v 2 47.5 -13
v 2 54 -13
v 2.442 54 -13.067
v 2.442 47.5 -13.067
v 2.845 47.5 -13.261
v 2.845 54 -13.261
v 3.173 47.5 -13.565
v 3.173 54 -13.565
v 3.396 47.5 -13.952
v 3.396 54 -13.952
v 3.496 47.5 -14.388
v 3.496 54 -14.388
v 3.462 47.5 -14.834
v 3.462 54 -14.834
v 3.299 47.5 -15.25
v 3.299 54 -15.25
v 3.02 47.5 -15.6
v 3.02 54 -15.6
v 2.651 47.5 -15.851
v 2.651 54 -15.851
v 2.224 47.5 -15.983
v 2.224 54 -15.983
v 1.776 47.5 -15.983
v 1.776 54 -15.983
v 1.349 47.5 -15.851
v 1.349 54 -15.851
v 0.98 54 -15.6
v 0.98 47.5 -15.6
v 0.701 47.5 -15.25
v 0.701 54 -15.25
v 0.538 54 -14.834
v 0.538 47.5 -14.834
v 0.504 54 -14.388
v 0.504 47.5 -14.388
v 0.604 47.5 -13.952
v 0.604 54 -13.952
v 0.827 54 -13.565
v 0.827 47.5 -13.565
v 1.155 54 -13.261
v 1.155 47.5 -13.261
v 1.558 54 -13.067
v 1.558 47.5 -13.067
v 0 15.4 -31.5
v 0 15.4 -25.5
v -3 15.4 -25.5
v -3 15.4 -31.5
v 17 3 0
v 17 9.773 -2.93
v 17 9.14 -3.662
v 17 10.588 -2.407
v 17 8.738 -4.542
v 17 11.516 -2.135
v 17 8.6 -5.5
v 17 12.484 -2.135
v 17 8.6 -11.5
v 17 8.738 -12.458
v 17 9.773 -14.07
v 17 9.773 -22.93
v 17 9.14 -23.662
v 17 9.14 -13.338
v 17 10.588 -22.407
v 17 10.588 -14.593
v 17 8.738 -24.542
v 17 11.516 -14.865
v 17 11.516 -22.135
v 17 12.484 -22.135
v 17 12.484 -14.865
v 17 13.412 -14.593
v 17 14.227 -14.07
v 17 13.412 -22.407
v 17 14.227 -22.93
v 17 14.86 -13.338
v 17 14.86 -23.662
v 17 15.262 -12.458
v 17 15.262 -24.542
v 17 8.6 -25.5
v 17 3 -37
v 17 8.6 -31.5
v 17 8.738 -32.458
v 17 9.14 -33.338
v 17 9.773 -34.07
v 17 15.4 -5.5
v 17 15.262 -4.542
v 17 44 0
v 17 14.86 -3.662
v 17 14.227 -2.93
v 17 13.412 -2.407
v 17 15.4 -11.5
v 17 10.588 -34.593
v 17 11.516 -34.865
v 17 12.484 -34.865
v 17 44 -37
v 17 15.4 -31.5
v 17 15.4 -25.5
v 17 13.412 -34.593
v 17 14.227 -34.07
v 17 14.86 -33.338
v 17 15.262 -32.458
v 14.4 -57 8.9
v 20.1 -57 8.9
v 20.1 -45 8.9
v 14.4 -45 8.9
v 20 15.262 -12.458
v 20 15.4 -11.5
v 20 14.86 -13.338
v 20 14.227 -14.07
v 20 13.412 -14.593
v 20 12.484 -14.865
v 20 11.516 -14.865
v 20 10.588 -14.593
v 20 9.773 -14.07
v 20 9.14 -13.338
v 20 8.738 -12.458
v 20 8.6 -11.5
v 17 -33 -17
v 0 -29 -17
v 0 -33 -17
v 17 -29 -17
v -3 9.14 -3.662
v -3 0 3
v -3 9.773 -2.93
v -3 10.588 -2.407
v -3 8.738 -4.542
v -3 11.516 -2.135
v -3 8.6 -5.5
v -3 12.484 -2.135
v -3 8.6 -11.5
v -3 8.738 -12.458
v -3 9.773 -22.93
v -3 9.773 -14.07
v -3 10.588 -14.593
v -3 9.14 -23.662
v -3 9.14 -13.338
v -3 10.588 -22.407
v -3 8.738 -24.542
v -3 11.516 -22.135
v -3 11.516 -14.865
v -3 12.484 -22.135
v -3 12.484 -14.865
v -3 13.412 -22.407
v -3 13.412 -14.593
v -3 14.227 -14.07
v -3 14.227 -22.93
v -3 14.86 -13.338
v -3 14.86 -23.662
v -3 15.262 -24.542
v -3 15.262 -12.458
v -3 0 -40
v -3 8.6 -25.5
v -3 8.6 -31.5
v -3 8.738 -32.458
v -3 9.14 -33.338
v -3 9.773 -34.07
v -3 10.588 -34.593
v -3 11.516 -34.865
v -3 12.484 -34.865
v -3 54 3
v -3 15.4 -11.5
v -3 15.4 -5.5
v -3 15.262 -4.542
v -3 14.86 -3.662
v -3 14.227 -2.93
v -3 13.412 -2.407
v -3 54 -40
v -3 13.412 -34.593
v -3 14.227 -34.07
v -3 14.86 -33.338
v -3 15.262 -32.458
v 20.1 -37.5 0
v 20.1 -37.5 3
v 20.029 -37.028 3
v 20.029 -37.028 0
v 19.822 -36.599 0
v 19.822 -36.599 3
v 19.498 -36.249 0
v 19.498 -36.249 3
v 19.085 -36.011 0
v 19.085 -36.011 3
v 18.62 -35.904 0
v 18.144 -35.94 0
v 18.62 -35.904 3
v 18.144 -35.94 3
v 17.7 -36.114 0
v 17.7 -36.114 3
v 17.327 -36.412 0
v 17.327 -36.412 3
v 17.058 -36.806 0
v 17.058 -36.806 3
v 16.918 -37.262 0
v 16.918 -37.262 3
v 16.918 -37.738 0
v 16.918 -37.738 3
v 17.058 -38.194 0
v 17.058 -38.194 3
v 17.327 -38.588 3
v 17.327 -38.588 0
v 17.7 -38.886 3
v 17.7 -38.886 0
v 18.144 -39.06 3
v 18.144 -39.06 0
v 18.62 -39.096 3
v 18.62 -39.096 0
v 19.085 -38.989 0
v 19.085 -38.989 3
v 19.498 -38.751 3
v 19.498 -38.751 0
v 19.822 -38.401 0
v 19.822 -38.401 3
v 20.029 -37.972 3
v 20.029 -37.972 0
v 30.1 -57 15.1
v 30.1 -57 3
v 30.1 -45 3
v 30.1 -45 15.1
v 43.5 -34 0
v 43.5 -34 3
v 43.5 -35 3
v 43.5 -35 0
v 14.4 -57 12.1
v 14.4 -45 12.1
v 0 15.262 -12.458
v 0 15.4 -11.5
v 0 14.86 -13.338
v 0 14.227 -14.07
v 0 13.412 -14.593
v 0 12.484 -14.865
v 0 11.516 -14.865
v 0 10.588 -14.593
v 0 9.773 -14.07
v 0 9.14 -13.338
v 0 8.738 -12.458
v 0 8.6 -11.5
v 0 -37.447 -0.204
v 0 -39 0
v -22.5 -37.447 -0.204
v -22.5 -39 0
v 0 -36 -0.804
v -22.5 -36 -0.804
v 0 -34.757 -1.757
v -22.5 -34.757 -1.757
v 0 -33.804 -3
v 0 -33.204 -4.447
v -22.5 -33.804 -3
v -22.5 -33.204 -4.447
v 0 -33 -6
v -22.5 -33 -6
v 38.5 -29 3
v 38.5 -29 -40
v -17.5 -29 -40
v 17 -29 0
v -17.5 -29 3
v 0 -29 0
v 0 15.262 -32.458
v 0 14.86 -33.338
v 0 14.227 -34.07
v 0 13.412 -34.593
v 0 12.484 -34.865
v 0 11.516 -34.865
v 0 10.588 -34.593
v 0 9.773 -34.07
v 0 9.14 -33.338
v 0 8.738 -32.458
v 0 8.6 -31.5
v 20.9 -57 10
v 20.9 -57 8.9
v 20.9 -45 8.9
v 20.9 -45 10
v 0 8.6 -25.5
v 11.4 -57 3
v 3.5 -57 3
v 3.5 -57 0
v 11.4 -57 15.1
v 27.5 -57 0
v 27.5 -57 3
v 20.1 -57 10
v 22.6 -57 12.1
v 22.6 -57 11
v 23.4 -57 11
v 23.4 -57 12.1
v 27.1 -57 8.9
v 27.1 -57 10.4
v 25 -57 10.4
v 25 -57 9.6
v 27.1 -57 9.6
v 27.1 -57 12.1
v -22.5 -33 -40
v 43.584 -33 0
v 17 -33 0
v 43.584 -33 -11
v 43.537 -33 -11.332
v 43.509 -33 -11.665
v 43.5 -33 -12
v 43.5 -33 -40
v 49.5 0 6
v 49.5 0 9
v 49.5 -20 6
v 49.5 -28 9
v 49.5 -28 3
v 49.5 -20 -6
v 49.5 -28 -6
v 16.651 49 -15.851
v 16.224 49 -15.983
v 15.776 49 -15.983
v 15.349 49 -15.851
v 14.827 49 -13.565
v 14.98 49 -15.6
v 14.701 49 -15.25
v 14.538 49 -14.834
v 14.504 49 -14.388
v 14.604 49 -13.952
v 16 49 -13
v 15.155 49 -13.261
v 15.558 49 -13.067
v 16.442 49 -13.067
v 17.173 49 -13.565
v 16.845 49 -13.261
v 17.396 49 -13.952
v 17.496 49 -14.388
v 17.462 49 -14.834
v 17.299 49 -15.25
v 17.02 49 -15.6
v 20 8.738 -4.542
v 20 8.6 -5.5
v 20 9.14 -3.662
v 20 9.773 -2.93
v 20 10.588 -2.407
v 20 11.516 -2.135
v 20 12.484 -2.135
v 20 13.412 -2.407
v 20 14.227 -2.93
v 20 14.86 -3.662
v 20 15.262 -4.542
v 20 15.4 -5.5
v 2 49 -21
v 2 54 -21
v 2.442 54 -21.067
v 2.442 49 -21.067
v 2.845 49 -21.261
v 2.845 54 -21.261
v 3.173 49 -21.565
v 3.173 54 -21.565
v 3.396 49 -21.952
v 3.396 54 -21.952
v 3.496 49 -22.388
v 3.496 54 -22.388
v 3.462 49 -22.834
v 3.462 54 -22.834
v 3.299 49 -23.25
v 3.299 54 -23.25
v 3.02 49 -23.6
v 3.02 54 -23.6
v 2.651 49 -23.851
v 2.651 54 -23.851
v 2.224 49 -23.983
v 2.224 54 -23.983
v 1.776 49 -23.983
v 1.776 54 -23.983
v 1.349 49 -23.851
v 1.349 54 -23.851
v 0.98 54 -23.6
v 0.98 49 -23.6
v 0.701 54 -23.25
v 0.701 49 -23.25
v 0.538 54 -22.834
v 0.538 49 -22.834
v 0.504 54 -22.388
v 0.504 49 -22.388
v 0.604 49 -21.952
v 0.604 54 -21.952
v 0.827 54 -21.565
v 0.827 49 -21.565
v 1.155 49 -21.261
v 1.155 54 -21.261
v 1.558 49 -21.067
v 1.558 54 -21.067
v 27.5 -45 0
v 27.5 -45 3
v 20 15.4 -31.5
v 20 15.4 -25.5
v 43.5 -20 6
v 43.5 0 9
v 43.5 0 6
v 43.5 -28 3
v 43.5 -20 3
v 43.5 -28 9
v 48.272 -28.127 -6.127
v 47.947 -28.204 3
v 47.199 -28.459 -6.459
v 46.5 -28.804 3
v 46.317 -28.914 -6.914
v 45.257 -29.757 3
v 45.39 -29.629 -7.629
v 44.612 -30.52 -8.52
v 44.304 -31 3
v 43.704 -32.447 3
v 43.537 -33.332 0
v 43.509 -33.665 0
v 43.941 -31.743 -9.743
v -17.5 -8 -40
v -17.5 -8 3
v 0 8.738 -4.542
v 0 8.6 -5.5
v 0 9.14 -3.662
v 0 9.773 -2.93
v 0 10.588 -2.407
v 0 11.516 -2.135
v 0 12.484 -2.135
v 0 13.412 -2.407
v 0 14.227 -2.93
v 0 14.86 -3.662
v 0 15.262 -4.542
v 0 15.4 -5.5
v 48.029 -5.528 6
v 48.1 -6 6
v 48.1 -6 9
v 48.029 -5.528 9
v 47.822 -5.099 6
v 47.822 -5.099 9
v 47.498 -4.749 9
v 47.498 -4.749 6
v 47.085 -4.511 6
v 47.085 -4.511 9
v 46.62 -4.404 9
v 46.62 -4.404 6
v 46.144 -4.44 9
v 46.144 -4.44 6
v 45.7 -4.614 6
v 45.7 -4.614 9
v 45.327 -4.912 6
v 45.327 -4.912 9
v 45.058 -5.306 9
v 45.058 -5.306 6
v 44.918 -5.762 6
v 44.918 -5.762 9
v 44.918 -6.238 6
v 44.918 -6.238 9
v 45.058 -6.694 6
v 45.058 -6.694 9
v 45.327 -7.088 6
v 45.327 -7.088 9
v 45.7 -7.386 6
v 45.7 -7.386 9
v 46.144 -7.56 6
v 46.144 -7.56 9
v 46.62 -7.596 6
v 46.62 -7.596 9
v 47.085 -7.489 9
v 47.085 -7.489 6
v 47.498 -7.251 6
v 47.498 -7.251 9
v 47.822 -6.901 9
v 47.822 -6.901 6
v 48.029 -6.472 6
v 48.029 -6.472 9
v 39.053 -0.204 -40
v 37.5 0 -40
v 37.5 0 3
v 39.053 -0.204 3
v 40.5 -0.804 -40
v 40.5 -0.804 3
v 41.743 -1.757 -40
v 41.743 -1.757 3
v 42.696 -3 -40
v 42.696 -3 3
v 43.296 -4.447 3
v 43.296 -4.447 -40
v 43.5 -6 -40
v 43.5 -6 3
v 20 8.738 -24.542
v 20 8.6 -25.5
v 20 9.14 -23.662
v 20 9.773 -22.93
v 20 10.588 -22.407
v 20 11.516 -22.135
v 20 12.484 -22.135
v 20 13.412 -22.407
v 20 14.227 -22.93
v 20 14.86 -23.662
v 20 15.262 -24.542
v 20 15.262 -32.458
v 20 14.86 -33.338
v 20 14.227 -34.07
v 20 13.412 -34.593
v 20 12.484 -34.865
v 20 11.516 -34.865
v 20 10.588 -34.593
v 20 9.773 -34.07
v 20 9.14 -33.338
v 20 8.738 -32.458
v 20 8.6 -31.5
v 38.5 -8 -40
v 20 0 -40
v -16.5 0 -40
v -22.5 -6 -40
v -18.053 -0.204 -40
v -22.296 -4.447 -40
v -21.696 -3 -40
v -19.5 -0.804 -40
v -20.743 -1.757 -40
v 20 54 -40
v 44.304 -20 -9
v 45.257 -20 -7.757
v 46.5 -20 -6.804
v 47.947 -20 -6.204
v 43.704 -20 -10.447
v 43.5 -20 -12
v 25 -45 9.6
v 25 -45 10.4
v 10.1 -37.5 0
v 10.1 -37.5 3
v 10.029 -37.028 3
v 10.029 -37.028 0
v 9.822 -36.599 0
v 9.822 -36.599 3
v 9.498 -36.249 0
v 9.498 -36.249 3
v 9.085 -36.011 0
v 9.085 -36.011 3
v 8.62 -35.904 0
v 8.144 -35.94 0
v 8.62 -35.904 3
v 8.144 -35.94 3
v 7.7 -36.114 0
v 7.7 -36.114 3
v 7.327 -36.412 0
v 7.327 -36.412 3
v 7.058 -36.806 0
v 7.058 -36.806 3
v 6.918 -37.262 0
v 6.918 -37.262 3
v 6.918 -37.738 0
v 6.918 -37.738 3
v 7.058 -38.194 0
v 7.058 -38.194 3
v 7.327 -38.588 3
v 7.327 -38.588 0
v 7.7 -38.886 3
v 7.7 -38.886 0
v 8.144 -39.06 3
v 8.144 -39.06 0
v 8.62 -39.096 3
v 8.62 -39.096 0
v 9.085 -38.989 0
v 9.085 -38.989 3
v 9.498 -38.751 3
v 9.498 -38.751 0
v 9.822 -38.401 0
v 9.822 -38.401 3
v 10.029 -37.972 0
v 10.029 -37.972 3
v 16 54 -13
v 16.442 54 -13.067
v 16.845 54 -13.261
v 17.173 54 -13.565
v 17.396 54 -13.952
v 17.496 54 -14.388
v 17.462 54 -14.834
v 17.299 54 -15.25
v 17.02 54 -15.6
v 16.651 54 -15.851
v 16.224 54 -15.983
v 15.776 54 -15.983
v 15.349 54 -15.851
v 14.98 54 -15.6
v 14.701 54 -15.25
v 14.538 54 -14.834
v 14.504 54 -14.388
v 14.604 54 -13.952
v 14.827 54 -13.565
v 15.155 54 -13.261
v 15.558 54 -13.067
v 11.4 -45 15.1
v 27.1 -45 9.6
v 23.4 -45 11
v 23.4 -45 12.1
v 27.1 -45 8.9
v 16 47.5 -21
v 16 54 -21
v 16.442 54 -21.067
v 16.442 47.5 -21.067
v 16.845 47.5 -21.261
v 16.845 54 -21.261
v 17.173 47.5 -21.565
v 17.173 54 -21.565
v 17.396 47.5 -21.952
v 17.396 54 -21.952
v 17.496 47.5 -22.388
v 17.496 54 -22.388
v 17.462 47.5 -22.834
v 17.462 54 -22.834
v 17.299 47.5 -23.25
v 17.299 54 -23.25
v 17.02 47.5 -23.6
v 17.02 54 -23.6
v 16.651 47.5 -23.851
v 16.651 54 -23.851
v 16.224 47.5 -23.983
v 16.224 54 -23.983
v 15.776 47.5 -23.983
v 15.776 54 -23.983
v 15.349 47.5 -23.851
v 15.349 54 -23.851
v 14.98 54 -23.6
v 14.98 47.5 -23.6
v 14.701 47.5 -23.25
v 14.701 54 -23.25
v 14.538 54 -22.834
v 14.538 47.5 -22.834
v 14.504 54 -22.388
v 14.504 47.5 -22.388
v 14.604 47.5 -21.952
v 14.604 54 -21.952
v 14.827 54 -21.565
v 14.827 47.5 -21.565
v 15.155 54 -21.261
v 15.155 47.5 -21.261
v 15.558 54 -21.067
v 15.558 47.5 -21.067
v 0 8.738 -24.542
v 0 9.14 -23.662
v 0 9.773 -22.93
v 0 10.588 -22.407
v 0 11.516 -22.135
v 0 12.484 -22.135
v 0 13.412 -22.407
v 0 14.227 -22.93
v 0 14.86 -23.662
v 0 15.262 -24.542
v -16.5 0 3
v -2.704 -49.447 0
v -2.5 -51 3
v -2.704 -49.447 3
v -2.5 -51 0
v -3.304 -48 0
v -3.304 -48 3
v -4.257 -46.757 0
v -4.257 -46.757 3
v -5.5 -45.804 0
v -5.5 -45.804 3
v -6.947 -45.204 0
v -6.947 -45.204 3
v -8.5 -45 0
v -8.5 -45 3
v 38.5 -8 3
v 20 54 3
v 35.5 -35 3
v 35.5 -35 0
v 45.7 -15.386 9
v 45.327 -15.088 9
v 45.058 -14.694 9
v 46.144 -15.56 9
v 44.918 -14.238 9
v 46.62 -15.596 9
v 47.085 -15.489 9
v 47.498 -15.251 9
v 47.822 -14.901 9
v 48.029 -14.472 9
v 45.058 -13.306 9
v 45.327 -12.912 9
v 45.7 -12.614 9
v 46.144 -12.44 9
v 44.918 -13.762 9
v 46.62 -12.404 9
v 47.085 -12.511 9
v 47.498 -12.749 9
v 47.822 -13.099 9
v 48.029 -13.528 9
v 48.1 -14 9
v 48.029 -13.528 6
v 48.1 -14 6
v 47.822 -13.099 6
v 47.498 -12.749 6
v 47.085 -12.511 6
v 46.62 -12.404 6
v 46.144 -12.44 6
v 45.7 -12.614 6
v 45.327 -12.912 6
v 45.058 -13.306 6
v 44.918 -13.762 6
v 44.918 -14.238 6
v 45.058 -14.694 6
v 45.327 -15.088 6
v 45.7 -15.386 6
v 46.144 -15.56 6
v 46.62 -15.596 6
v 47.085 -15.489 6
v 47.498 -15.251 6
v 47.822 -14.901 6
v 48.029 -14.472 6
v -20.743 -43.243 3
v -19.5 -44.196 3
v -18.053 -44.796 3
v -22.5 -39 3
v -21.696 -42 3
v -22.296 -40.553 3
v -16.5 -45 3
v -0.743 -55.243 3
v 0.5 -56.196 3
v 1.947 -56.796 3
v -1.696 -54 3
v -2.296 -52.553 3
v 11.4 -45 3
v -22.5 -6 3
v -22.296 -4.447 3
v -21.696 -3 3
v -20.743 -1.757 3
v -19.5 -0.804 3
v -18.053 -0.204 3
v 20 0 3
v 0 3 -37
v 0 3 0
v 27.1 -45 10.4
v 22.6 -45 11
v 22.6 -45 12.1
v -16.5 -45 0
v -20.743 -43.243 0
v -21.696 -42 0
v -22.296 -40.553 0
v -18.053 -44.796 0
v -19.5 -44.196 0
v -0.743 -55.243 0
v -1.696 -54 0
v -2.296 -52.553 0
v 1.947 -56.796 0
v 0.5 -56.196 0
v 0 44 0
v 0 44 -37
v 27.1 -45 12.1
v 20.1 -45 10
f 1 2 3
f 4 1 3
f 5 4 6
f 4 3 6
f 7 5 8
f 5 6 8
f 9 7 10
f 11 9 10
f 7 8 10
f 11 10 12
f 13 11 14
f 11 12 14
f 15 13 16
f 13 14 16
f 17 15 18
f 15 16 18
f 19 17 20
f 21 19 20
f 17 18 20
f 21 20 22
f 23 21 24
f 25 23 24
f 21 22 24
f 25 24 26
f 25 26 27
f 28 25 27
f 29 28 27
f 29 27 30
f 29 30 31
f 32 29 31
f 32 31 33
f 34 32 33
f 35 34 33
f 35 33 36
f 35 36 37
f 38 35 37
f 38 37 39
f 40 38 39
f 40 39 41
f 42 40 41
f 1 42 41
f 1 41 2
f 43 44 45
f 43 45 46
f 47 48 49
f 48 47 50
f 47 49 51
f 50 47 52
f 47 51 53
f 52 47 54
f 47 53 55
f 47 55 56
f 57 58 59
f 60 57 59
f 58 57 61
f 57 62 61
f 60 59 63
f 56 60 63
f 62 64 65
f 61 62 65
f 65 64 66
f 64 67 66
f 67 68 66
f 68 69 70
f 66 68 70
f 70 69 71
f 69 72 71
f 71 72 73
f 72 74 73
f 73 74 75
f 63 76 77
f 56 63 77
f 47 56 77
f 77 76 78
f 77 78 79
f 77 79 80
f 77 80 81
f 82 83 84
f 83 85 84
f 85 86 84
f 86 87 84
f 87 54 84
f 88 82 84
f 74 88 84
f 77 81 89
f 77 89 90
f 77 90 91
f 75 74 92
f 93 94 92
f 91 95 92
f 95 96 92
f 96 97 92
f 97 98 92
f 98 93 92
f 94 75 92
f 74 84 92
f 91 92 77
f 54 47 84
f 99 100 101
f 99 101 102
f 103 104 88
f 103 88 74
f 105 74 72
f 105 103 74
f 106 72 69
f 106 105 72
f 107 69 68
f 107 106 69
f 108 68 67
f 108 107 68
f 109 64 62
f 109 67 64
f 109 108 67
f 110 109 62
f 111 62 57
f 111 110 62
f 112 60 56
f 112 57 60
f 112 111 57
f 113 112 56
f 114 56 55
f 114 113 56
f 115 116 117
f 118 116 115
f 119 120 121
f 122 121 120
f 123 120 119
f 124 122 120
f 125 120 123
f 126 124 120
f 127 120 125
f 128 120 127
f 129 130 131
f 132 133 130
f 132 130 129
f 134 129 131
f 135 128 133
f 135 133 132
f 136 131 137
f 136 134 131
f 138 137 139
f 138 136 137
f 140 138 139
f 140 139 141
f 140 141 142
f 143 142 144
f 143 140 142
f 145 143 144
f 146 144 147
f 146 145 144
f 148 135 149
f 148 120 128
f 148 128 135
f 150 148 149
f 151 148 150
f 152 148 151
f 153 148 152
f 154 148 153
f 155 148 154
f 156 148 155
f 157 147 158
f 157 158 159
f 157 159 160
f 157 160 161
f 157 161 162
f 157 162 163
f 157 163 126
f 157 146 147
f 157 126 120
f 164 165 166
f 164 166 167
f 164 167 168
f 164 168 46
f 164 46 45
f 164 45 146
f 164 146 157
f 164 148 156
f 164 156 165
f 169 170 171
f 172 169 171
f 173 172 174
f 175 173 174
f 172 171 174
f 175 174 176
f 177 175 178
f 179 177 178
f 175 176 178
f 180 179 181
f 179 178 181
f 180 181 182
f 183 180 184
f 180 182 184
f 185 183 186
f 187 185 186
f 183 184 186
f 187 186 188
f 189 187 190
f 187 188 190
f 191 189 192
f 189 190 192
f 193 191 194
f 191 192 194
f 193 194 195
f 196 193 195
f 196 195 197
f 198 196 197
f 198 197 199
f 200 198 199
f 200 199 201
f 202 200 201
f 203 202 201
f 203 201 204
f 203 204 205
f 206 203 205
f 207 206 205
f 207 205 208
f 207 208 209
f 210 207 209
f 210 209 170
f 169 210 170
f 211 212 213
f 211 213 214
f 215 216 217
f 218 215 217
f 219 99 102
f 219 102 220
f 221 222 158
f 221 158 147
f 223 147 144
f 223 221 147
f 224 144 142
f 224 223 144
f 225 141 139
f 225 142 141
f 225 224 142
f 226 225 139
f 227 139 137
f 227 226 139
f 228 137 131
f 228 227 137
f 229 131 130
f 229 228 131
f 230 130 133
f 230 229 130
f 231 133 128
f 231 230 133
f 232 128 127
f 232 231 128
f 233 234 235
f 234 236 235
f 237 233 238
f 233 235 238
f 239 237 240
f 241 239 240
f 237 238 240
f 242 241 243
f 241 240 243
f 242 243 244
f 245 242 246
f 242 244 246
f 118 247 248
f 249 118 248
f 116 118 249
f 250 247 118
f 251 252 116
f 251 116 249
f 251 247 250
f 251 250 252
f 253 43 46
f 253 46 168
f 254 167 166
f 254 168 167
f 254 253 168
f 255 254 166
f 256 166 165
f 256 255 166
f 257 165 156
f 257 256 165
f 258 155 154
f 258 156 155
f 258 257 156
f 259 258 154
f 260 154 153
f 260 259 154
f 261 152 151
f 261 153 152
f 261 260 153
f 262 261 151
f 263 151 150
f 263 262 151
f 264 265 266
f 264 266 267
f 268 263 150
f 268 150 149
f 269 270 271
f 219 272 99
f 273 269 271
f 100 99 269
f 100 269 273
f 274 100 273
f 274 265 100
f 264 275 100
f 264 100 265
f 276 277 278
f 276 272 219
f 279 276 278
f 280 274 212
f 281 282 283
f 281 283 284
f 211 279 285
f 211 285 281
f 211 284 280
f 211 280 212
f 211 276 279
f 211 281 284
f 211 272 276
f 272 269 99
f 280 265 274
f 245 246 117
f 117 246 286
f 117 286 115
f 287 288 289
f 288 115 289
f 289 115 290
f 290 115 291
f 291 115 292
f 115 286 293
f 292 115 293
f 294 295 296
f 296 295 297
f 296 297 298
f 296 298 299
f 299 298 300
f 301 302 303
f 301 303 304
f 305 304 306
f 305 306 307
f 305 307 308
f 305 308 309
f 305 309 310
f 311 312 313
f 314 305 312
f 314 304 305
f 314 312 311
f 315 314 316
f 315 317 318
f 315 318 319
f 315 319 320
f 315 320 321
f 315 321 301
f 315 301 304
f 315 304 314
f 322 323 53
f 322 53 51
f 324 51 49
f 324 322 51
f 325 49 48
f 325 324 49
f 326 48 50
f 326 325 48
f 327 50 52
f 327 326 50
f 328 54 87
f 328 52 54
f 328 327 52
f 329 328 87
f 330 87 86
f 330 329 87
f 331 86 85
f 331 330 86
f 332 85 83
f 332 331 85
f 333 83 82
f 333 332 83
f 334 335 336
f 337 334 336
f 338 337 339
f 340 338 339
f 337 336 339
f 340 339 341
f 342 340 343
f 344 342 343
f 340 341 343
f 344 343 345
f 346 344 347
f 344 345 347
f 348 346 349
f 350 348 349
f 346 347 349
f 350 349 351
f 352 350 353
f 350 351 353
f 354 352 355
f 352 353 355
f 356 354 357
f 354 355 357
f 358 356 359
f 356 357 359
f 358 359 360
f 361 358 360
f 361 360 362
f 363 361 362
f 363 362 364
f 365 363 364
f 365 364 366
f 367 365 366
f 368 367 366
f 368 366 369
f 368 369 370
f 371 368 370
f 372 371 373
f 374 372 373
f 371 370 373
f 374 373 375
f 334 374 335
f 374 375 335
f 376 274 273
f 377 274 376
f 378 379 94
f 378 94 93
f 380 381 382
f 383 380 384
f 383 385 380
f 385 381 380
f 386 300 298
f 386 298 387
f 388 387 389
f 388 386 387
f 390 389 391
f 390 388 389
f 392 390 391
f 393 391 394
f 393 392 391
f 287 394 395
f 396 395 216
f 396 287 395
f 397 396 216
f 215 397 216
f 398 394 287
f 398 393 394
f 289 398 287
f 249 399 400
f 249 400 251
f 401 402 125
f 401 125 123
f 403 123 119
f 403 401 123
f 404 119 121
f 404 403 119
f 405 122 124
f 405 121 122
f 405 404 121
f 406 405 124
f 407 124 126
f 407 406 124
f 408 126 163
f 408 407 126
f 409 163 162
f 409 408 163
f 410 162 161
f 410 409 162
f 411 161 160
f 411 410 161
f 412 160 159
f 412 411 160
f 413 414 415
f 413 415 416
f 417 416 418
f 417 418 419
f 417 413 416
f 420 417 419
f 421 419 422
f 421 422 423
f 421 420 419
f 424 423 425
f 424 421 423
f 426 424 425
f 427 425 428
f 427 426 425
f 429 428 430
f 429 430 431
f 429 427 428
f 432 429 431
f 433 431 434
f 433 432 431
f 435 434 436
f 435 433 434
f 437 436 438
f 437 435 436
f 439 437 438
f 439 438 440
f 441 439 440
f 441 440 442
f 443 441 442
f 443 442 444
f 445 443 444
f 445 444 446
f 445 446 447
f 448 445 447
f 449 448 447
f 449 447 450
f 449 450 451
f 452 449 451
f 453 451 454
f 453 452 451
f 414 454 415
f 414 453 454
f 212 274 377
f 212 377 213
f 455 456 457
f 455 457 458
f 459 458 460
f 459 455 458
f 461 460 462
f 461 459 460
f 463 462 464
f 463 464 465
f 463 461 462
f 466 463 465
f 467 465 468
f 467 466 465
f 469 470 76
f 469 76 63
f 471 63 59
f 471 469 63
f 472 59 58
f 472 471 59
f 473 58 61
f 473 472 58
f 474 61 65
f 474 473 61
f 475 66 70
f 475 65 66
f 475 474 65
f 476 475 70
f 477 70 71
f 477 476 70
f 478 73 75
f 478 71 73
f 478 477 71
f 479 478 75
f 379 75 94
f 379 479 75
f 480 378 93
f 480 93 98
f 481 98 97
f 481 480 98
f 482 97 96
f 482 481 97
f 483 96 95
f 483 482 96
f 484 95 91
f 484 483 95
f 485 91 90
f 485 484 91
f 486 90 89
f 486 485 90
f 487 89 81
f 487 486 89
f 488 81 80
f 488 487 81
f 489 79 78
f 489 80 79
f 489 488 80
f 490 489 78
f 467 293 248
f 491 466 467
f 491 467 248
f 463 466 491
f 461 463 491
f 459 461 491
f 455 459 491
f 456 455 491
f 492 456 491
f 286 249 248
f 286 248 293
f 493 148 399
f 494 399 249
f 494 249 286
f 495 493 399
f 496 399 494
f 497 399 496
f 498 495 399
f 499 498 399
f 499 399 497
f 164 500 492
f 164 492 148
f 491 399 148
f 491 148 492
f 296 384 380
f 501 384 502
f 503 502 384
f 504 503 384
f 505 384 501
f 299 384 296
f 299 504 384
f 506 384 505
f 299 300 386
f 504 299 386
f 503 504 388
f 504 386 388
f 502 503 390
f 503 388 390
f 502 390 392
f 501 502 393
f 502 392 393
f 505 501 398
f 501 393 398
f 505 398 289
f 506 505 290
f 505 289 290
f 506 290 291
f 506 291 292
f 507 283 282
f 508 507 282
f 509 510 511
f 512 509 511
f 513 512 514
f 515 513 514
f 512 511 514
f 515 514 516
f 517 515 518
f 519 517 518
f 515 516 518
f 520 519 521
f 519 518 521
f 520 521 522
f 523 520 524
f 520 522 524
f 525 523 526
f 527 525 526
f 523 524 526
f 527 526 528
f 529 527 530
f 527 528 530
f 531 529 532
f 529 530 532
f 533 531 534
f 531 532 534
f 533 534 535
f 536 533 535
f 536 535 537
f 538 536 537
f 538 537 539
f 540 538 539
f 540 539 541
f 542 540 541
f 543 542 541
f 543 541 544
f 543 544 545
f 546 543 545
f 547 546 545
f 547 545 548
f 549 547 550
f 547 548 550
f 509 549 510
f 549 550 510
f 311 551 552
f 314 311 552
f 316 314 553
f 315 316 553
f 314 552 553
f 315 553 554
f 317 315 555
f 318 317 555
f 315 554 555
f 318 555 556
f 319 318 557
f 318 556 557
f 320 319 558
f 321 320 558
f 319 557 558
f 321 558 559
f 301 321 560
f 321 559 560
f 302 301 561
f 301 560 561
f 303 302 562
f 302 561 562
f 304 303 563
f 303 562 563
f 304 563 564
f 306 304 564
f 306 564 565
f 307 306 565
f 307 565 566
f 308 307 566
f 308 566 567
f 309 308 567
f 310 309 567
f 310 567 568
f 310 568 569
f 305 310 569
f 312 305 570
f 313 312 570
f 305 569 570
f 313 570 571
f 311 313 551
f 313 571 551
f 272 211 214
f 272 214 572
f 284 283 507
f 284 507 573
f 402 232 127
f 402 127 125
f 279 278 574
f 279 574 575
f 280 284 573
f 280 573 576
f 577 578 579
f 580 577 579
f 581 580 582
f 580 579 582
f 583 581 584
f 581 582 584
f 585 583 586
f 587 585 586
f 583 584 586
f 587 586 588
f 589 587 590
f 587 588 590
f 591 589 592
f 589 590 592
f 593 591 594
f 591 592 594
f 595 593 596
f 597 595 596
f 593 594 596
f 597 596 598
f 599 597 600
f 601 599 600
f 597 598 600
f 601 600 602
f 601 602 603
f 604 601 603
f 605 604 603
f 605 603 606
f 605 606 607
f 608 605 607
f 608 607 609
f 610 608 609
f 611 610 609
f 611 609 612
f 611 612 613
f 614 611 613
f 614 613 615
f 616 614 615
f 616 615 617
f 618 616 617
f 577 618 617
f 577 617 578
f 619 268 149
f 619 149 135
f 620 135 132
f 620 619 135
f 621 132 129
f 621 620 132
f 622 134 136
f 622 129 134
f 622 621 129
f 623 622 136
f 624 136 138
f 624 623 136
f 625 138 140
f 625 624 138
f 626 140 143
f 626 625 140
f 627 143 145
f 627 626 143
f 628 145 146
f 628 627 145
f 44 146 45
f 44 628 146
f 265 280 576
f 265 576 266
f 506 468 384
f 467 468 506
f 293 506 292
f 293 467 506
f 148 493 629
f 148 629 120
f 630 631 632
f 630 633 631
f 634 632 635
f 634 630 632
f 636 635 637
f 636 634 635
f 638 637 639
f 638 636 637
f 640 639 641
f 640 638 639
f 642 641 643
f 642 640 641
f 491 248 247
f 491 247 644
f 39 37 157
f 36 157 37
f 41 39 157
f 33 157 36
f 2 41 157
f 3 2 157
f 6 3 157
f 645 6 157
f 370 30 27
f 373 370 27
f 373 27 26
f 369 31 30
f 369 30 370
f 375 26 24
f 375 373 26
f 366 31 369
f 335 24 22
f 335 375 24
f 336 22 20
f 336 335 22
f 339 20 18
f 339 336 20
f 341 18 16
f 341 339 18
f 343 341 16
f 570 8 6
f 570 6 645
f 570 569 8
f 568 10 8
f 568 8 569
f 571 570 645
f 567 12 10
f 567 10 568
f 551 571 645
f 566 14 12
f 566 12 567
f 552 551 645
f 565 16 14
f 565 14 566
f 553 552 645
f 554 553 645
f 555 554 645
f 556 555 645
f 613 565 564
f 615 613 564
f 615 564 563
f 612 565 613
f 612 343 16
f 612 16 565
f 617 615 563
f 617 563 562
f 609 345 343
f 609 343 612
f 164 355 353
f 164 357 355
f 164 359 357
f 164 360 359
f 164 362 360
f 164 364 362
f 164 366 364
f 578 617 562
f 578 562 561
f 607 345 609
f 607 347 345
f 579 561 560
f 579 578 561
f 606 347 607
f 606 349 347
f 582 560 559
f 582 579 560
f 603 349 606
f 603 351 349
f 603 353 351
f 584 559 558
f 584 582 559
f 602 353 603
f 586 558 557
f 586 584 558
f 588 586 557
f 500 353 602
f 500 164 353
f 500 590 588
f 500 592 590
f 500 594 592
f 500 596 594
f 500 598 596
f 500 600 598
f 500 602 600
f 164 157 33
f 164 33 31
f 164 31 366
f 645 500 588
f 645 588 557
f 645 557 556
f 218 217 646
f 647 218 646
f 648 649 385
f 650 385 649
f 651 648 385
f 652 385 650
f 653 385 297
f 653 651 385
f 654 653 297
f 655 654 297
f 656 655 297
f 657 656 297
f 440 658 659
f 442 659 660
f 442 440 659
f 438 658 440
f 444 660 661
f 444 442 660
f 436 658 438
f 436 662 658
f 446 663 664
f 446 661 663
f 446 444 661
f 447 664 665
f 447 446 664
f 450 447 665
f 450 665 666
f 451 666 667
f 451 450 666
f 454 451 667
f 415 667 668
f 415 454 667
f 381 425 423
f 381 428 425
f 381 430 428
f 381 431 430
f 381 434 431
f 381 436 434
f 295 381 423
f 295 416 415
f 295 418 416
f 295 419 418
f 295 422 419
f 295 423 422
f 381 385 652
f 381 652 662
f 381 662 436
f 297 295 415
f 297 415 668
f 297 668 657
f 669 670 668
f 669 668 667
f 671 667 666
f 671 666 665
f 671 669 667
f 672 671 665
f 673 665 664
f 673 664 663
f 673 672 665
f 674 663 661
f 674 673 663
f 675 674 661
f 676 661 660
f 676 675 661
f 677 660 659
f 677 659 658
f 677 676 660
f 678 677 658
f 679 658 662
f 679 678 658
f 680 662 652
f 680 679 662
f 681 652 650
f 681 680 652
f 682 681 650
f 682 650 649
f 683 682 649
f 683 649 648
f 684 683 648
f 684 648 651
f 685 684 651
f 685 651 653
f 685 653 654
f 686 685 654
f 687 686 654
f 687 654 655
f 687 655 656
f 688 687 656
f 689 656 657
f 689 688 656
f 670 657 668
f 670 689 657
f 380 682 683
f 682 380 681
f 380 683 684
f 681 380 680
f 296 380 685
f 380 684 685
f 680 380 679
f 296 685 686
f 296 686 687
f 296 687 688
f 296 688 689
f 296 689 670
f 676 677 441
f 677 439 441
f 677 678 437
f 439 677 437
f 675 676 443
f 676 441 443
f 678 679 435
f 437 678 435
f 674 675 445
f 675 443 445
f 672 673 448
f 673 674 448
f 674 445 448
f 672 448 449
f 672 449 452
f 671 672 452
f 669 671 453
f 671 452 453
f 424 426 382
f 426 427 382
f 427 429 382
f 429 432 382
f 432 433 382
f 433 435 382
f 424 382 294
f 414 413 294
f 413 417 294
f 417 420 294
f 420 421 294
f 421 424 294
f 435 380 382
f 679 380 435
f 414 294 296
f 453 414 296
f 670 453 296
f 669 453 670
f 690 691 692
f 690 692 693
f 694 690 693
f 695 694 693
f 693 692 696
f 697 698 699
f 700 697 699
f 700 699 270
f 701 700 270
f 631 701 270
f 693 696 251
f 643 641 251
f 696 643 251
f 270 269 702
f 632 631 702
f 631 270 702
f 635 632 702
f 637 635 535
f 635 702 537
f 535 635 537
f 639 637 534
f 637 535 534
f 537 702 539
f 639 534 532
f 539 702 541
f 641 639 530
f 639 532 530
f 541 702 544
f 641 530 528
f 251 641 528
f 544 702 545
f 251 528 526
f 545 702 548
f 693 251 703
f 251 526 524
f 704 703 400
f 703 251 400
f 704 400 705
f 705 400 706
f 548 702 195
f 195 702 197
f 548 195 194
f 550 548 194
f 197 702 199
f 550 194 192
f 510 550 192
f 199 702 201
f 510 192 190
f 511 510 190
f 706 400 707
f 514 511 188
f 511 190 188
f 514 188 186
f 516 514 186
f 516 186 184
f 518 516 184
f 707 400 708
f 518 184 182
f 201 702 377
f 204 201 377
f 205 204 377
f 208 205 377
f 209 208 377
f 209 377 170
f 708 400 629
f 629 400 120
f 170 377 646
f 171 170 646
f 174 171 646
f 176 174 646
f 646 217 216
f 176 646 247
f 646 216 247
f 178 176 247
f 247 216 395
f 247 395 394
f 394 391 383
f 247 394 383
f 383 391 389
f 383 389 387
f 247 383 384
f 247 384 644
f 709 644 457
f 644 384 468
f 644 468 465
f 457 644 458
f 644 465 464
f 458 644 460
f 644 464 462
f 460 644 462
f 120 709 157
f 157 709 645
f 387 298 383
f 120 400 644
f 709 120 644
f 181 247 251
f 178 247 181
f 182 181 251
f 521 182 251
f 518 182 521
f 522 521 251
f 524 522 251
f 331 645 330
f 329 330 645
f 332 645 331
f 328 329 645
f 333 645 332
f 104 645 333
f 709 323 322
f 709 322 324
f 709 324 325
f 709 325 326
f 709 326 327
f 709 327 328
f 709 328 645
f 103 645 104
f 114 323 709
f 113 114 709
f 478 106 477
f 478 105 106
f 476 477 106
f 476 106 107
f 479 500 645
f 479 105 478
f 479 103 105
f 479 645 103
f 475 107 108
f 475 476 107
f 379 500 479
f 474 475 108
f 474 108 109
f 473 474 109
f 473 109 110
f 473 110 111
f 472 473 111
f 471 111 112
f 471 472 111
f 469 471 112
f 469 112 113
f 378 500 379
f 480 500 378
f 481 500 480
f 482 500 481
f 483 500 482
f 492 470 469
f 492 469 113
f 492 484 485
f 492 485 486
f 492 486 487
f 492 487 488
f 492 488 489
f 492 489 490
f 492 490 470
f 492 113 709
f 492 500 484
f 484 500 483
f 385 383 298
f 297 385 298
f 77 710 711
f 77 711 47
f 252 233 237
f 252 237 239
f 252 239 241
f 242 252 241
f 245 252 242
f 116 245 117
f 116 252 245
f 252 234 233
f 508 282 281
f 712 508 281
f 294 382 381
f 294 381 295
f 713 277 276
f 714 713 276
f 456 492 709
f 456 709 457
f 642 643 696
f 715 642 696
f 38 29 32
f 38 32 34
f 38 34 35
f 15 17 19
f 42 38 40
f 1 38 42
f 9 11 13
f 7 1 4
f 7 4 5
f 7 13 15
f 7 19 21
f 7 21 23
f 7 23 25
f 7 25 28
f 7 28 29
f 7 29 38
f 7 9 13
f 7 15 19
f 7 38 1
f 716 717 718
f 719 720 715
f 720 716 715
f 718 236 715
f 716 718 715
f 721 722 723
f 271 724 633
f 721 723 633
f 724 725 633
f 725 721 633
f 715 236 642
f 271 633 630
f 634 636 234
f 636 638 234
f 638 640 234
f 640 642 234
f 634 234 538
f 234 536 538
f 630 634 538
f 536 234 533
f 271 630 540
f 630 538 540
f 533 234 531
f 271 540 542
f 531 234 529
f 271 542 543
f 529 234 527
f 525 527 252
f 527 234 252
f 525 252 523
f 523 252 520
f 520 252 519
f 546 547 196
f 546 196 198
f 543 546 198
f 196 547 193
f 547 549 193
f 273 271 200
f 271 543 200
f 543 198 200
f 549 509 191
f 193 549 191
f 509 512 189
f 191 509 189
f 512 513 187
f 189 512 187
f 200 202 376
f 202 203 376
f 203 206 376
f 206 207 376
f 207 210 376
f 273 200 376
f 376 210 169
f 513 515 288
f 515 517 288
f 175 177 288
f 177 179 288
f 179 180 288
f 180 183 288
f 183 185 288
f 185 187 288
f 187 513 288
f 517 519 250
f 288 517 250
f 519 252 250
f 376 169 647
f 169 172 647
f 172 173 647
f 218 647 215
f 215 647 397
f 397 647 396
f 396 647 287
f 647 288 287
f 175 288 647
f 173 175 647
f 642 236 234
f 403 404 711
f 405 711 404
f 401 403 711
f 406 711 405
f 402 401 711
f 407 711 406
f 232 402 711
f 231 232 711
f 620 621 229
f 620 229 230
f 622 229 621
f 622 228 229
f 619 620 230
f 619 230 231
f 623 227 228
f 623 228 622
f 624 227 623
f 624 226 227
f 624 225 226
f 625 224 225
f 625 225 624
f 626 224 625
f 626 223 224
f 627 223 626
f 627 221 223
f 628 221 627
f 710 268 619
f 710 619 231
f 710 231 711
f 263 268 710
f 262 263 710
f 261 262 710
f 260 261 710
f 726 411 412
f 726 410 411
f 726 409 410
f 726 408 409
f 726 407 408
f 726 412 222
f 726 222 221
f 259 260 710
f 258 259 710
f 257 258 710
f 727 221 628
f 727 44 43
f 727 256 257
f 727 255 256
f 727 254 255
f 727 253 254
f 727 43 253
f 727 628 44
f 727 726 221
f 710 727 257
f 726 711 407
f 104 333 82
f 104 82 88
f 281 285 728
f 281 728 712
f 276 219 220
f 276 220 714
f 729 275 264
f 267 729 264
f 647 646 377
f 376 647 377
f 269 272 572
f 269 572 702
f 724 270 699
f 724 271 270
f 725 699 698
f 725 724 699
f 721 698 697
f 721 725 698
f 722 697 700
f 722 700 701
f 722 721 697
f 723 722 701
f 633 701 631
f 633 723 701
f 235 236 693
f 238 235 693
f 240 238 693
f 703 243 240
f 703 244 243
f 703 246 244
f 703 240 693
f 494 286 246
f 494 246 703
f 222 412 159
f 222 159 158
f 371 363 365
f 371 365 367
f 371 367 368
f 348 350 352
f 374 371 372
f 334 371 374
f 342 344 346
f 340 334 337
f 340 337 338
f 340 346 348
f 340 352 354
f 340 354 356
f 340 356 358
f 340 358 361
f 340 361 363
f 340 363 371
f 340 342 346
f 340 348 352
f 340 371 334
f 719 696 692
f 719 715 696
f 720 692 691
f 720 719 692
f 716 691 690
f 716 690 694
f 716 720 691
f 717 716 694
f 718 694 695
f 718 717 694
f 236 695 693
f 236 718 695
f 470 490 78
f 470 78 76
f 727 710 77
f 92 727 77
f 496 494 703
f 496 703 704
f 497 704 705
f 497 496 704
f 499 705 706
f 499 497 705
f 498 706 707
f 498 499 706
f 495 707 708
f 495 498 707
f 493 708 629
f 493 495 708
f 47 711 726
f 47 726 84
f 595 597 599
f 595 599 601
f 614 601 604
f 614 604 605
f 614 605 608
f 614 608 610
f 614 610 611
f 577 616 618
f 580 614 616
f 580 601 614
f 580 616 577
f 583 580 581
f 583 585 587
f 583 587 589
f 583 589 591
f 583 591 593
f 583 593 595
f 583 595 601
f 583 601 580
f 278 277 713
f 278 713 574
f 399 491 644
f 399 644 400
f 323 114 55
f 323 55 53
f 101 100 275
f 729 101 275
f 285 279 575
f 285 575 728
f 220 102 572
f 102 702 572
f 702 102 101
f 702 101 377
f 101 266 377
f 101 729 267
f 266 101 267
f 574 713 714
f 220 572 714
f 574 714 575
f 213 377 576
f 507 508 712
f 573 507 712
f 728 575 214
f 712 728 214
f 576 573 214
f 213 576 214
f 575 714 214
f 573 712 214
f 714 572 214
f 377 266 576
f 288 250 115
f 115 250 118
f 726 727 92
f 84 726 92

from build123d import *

# Parameters (mm, degrees)
SKETCH_2_W           = 17
SKETCH_2_H           = 17
EXTRUDE_1_DEPTH      = 47
SHELL_2_T            = 3
SKETCH_8_R           = 1.6
SKETCH_8_W           = 56
SKETCH_8_H           = 21
EXTRUDE_2_DEPTH      = 3
SKETCH_9_W           = 66
SKETCH_9_H           = 4
EXTRUDE_3_DEPTH      = 40
SKETCH_11_W          = 13
SKETCH_11_H          = 13
CUT_EXTRUDE_3_DEPTH  = 3
EXTRUDE_START        = -48
SKETCH_13_W          = 17
SKETCH_13_H          = 17
EXTRUDE_4_DEPTH      = 3
SKETCH_17_W          = 17
SKETCH_17_H          = 17
CUT_EXTRUDE_4_DEPTH  = 78.409624725
SKETCH_19_W          = 30
SKETCH_19_H          = 12
EXTRUDE_8_DEPTH      = 3
SKETCH_20_W          = 0.8
SKETCH_20_H          = 1.1
SKETCH_20_W_2        = 2.1
SKETCH_20_H_2        = 0.8
EXTRUDE_9_DEPTH      = 12
FILLET_5_R           = 6
EXTRUDE_11_DEPTH     = 20
EXTRUDE_START_2      = 3
SKETCH_23_W          = 6
SKETCH_23_H          = 28
SKETCH_23_R          = 1.6
EXTRUDE_12_DEPTH     = 3
EXTRUDE_START_3      = -28
SKETCH_24_W          = 6
SKETCH_24_H          = 12
EXTRUDE_13_DEPTH     = 8
FILLET_START         = -40
FILLET_6_DEPTH       = 43
FILLET_START_2       = -6
FILLET_6_2_DEPTH     = 9
FILLET_START_3       = -33
FILLET_6_3_DEPTH     = 13
FILLET_START_4       = -11
FILLET_6_4_DEPTH     = 11
EXTRUDE_START_4      = 12
EXTRUDE_14_DEPTH     = 12
SKETCH_26_W          = 17
SKETCH_26_H          = 29
CUT_EXTRUDE_6_DEPTH  = 50
SKETCH_29_W          = 35
SKETCH_29_H          = 4
EXTRUDE_15_DEPTH     = 23
SKETCH_30_W          = 23
SKETCH_30_H          = 35
EXTRUDE_16_DEPTH     = 10
EXTRUDE_START_5      = 8
EXTRUDE_17_DEPTH     = 8
CUT_EXTRUDE_10_DEPTH = 82.579715616
SKETCH_33_W          = 17
SKETCH_33_H          = 37
CUT_EXTRUDE_11_DEPTH = 44
SKETCH_35_W          = 17
SKETCH_35_H          = 37
EXTRUDE_18_DEPTH     = 3
SKETCH_31_R          = 1.5
CUT_EXTRUDE_13_DEPTH = 5
SKETCH_39_R          = 1.5
CUT_EXTRUDE_14_DEPTH = 1.5


with BuildPart() as part:
    # 草图2 → 凸台-拉伸1 (new body)
    with BuildSketch(Plane(origin=(0, 0, 0), x_dir=(1, 0, 0), z_dir=(0, 1, 0))):
        with Locations((8.5, 8.5)):
            Rectangle(SKETCH_2_W, SKETCH_2_H)
    extrude(amount=EXTRUDE_1_DEPTH)

    # 抽壳2
    shell_2_openings = [part.faces().sort_by_distance(p)[0] for p in [
        (8.5, 0, -8.5),
    ]]
    offset(amount=SHELL_2_T, openings=shell_2_openings, kind=Kind.INTERSECTION)

    # 草图8 → 凸台-拉伸2 (add)
    with BuildSketch(Plane.XY.offset(3)):
        Polygon((-22.5, 0), (43.5, 0), (43.5, -35), (35.5, -35), (27.5, -45), (-22.5, -45), align=None)
        with Locations((8.5, -37.5)):
            Circle(SKETCH_8_R, mode=Mode.SUBTRACT)
        with Locations((18.5, -37.5)):
            Circle(SKETCH_8_R, mode=Mode.SUBTRACT)
        with Locations((10.5, -18.5)):
            Rectangle(SKETCH_8_W, SKETCH_8_H, mode=Mode.SUBTRACT)
    extrude(amount=-EXTRUDE_2_DEPTH)

    # 草图9 → 凸台-拉伸3 (add)
    with BuildSketch(Plane(origin=(0, 0, 0), x_dir=(-1, 0, 0), z_dir=(0, 0, -1))):
        with Locations((-10.5, -31)):
            Rectangle(SKETCH_9_W, SKETCH_9_H)
    extrude(amount=EXTRUDE_3_DEPTH)

    # 草图11 → 切除-拉伸3 (cut)
    with BuildSketch(Plane(origin=(0, 50, 0), x_dir=(1, 0, 0), z_dir=(0, 1, 0))):
        with Locations((8.5, 8.5)):
            Rectangle(SKETCH_11_W, SKETCH_11_H)
    extrude(amount=-CUT_EXTRUDE_3_DEPTH, mode=Mode.SUBTRACT)

    # 草图13 → 凸台-拉伸4 (add)
    with BuildSketch(Plane(origin=(0, 50, 0), x_dir=(1, 0, 0), z_dir=(0, 1, 0)).offset(EXTRUDE_START)):
        with Locations((8.5, 8.5)):
            Rectangle(SKETCH_13_W, SKETCH_13_H)
    extrude(amount=EXTRUDE_4_DEPTH)

    # 草图17 → 切除-拉伸4 (cut, through all)
    with BuildSketch(Plane(origin=(0, 5, 0), x_dir=(1, 0, 0), z_dir=(0, 1, 0))):
        with Locations((8.5, 8.5)):
            Rectangle(SKETCH_17_W, SKETCH_17_H)
    extrude(amount=-CUT_EXTRUDE_4_DEPTH, mode=Mode.SUBTRACT)

    # 草图19 → 凸台-拉伸8 (add)
    with BuildSketch(Plane.XY.offset(3)):
        with Locations((12.5, -51)):
            Rectangle(SKETCH_19_W, SKETCH_19_H)
    extrude(amount=-EXTRUDE_8_DEPTH)

    # 草图20 → 凸台-拉伸9 (add)
    # profile 1 of 4: a face of its own
    with BuildSketch(Plane.XZ.offset(57)):
        Polygon((27.5, 3), (30.1, 3), (30.1, 15.1), (11.4, 15.1), (11.4, 3), align=None)
        Polygon((14.4, 8.9), (14.4, 12.1), (22.6, 12.1), (23.4, 12.1), (27.1, 12.1), (27.1, 10.4), (27.1, 9.6), (27.1, 8.9), (20.9, 8.9), (20.1, 8.9), align=None, mode=Mode.SUBTRACT)
    # profile 2 of 4: a face of its own
    with BuildSketch(Plane.XZ.offset(57)):
        with Locations((23, 11.55)):
            Rectangle(SKETCH_20_W, SKETCH_20_H)
    # profile 3 of 4: a face of its own
    with BuildSketch(Plane.XZ.offset(57)):
        with Locations((20.5, 9.45)):
            Rectangle(SKETCH_20_W, SKETCH_20_H)
    # profile 4 of 4: a face of its own
    with BuildSketch(Plane.XZ.offset(57)):
        with Locations((26.05, 10)):
            Rectangle(SKETCH_20_W_2, SKETCH_20_H_2)
    extrude(amount=-EXTRUDE_9_DEPTH)

    # 圆角5
    fillet_5_edges = [part.edges().sort_by_distance(p)[0] for p in [
        (-11.25, -33, 0),
        (-22.5, -45, 1.5),
        (-2.5, -57, 1.5),
        (-2.5, -45, 1.5),
    ]]
    fillet(fillet_5_edges, radius=FILLET_5_R - 0.0001)  # a hair under: the kernel refuses the full size

    # 草图22 → 凸台-拉伸11 (add)
    with BuildSketch(Plane(origin=(0, 0, 0), x_dir=(-1, 0, 0), z_dir=(0, 0, -1))):
        Polygon((0, 0), (-17, 0), (-20, 0), (-43.5, 0), (-43.5, -29), (-38.5, -29), (-38.5, -8), (17.5, -8), (17.5, -29), (22.5, -29), (22.5, 0), (3, 0), align=None)
    extrude(amount=EXTRUDE_11_DEPTH)



with BuildPart() as body_2:
    # 草图23 → 凸台-拉伸12 (new body)
    with BuildSketch(Plane.XY.offset(3).offset(EXTRUDE_START_2)):
        with Locations((46.5, -14)):
            Rectangle(SKETCH_23_W, SKETCH_23_H)
        with Locations((46.5, -6)):
            Circle(SKETCH_23_R, mode=Mode.SUBTRACT)
        with Locations((46.5, -14)):
            Circle(SKETCH_23_R, mode=Mode.SUBTRACT)
    extrude(amount=EXTRUDE_12_DEPTH)


with BuildPart() as part_1:
    add(part.part)

    add(body_2.part)  # 凸台-拉伸13 merges body 2
    # 草图24 → 凸台-拉伸13 (add)
    with BuildSketch(Plane(origin=(0, 0, 0), x_dir=(1, 0, 0), z_dir=(0, 1, 0)).offset(EXTRUDE_START_3)):
        with Locations((46.5, 0)):
            Rectangle(SKETCH_24_W, SKETCH_24_H)
    extrude(amount=EXTRUDE_13_DEPTH)

    # 圆角6: read off the stored shape, not the designer's step
    # 圆角6 outline → 圆角6 (cut)
    with BuildSketch(Plane.XY.offset(FILLET_START)):
        with BuildLine():
            ThreePointArc((37.5, 0), (41.742640687, -1.757359313), (43.5, -6))
            Line((43.5, -6), (43.5, 0))
            Line((43.5, 0), (37.5, 0))
        make_face()
        with BuildLine():
            Line((-22.5, 0), (-22.5, -6))
            ThreePointArc((-22.5, -6), (-20.742640687, -1.757359313), (-16.5, 0))
            Line((-16.5, 0), (-22.5, 0))
        make_face()
    extrude(amount=FILLET_6_DEPTH, mode=Mode.SUBTRACT)

    # Fillet 6 2 outline → Fillet 6 2 (add)
    with BuildSketch(Plane.XY.offset(FILLET_START_2)):
        with BuildLine():
            Line((43.5, -28), (43.5, -34))
            ThreePointArc((43.5, -34), (45.257359313, -29.757359313), (49.5, -28))
            Line((49.5, -28), (43.5, -28))
        make_face()
    extrude(amount=FILLET_6_2_DEPTH)

    # Fillet 6 3 outline → Fillet 6 3 (add)
    with BuildSketch(Plane(origin=(0, 0, 0), x_dir=(1, 0, 0), z_dir=(0, 1, 0)).offset(FILLET_START_3)):
        with BuildLine():
            ThreePointArc((49.5, 6), (45.257359313, 7.757359313), (43.5, 12))
            Line((43.5, 12), (43.5, 6))
            Line((43.5, 6), (49.5, 6))
        make_face()
    extrude(amount=FILLET_6_3_DEPTH)

    # Fillet 6 4 outline → Fillet 6 4 (cut)
    with BuildSketch(Plane.XY.offset(FILLET_START_4)):
        with BuildLine():
            ThreePointArc((49.5, -28), (45.627016654, -29.417424305), (43.583920217, -33))
            Line((43.583920217, -33), (49.5, -33))
            Line((49.5, -33), (49.5, -28))
        make_face()
        with BuildLine():
            ThreePointArc((43.5, -34), (43.521016863, -33.498242438), (43.583920217, -33))
            Line((43.583920217, -33), (43.5, -33))
            Line((43.5, -33), (43.5, -34))
        make_face()
    extrude(amount=FILLET_6_4_DEPTH, mode=Mode.SUBTRACT)

    # 草图25 → 凸台-拉伸14 (add)
    with BuildSketch(Plane(origin=(0, 0, -20), x_dir=(-1, 0, 0), z_dir=(0, 0, -1)).offset(EXTRUDE_START_4)):
        with BuildLine():
            Line((22.5, -29), (22.5, -6))
            ThreePointArc((22.5, -6), (20.742640687, -1.757359313), (16.5, 0))
            Line((16.5, 0), (3, 0))
            Line((3, 0), (3, 50))
            Line((3, 50), (-20, 50))
            Line((-20, 50), (-20, 0))
            Line((-20, 0), (-37.5, 0))
            ThreePointArc((-37.5, 0), (-41.742640687, -1.757359313), (-43.5, -6))
            Line((-43.5, -6), (-43.5, -29))
            Line((-43.5, -29), (-38.5, -29))
            Line((-38.5, -29), (-38.5, -8))
            Line((-38.5, -8), (17.5, -8))
            Line((17.5, -8), (17.5, -29))
            Line((17.5, -29), (22.5, -29))
        make_face()
    extrude(amount=-EXTRUDE_14_DEPTH)

    # 草图26 → 切除-拉伸6 (cut)
    with BuildSketch(Plane(origin=(0, 50, 0), x_dir=(1, 0, 0), z_dir=(0, 1, 0))):
        with Locations((8.5, 14.5)):
            Rectangle(SKETCH_26_W, SKETCH_26_H)
    extrude(amount=-CUT_EXTRUDE_6_DEPTH, mode=Mode.SUBTRACT)

    # 草图29 → 凸台-拉伸15 (add)
    with BuildSketch(Plane(origin=(20, 0, 0), x_dir=(0, 0, -1), z_dir=(1, 0, 0))):
        with Locations((14.5, 52)):
            Rectangle(SKETCH_29_W, SKETCH_29_H)
    extrude(amount=-EXTRUDE_15_DEPTH)

    # 草图30 → 凸台-拉伸16 (add)
    with BuildSketch(Plane(origin=(0, 54, 0), x_dir=(1, 0, 0), z_dir=(0, 1, 0))):
        with Locations((8.5, 14.5)):
            Rectangle(SKETCH_30_W, SKETCH_30_H)
    extrude(amount=-EXTRUDE_16_DEPTH)

    # 草图32 → 凸台-拉伸17 (add)
    with BuildSketch(Plane(origin=(0, 0, -32), x_dir=(-1, 0, 0), z_dir=(0, 0, -1)).offset(EXTRUDE_START_5)):
        with BuildLine():
            Line((-20, 0), (-37.5, 0))
            ThreePointArc((-37.5, 0), (-41.742640687, -1.757359313), (-43.5, -6))
            Line((-43.5, -6), (-43.5, -29))
            Line((-43.5, -29), (-38.5, -29))
            Line((-38.5, -29), (-38.5, -8))
            Line((-38.5, -8), (17.5, -8))
            Line((17.5, -8), (17.5, -29))
            Line((17.5, -29), (22.5, -29))
            Line((22.5, -29), (22.5, -6))
            ThreePointArc((22.5, -6), (20.742640687, -1.757359313), (16.5, 0))
            Line((16.5, 0), (3, 0))
            Line((3, 0), (3, 54))
            Line((3, 54), (-20, 54))
            Line((-20, 54), (-20, 0))
        make_face()
    extrude(amount=-EXTRUDE_17_DEPTH)

    # 草图34 → 切除-拉伸10 (cut, through all)
    with BuildSketch(Plane(origin=(20, 0, 0), x_dir=(0, 0, -1), z_dir=(1, 0, 0))):
        with BuildLine():
            Line((5.5, 15.4), (11.5, 15.4))
            ThreePointArc((11.5, 15.4), (14.9, 12), (11.5, 8.6))
            Line((11.5, 8.6), (5.5, 8.6))
            ThreePointArc((5.5, 8.6), (2.1, 12), (5.5, 15.4))
        make_face()
        with BuildLine():
            Line((25.5, 15.4), (31.5, 15.4))
            ThreePointArc((31.5, 15.4), (34.9, 12), (31.5, 8.6))
            Line((31.5, 8.6), (25.5, 8.6))
            ThreePointArc((25.5, 8.6), (22.1, 12), (25.5, 15.4))
        make_face()
    extrude(amount=-CUT_EXTRUDE_10_DEPTH, mode=Mode.SUBTRACT)

    # 草图33 → 切除-拉伸11 (cut)
    with BuildSketch(Plane(origin=(0, 0, 0), x_dir=(1, 0, 0), z_dir=(0, 1, 0))):
        with Locations((8.5, 18.5)):
            Rectangle(SKETCH_33_W, SKETCH_33_H)
    extrude(amount=CUT_EXTRUDE_11_DEPTH, mode=Mode.SUBTRACT)

    # 草图35 → 凸台-拉伸18 (add)
    with BuildSketch(Plane(origin=(0, 0, 0), x_dir=(1, 0, 0), z_dir=(0, 1, 0))):
        with Locations((8.5, 18.5)):
            Rectangle(SKETCH_35_W, SKETCH_35_H)
    extrude(amount=EXTRUDE_18_DEPTH)

    # 草图31 → 切除-拉伸13 (cut)
    with BuildSketch(Plane(origin=(0, 54, 0), x_dir=(1, 0, 0), z_dir=(0, 1, 0))):
        with Locations(Location((2, 22.5, 0), (0, 0, 270))):
            Circle(SKETCH_31_R)
        with Locations(Location((2, 14.5, 0), (0, 0, 270))):
            Circle(SKETCH_31_R)
        with Locations(Location((16, 22.5, 0), (0, 0, 270))):
            Circle(SKETCH_31_R)
        with Locations(Location((16, 14.5, 0), (0, 0, 270))):
            Circle(SKETCH_31_R)
    extrude(amount=-CUT_EXTRUDE_13_DEPTH, mode=Mode.SUBTRACT)

    # 草图39 → 切除-拉伸14 (cut)
    with BuildSketch(Plane(origin=(0, 49, 0), x_dir=(1, 0, 0), z_dir=(0, 1, 0))):
        with Locations(Location((2, 14.5, 0), (0, 0, 270))):
            Circle(SKETCH_39_R)
        with Locations(Location((16, 22.5, 0), (0, 0, 270))):
            Circle(SKETCH_39_R)
    extrude(amount=-CUT_EXTRUDE_14_DEPTH, mode=Mode.SUBTRACT)


solid = part_1.part
